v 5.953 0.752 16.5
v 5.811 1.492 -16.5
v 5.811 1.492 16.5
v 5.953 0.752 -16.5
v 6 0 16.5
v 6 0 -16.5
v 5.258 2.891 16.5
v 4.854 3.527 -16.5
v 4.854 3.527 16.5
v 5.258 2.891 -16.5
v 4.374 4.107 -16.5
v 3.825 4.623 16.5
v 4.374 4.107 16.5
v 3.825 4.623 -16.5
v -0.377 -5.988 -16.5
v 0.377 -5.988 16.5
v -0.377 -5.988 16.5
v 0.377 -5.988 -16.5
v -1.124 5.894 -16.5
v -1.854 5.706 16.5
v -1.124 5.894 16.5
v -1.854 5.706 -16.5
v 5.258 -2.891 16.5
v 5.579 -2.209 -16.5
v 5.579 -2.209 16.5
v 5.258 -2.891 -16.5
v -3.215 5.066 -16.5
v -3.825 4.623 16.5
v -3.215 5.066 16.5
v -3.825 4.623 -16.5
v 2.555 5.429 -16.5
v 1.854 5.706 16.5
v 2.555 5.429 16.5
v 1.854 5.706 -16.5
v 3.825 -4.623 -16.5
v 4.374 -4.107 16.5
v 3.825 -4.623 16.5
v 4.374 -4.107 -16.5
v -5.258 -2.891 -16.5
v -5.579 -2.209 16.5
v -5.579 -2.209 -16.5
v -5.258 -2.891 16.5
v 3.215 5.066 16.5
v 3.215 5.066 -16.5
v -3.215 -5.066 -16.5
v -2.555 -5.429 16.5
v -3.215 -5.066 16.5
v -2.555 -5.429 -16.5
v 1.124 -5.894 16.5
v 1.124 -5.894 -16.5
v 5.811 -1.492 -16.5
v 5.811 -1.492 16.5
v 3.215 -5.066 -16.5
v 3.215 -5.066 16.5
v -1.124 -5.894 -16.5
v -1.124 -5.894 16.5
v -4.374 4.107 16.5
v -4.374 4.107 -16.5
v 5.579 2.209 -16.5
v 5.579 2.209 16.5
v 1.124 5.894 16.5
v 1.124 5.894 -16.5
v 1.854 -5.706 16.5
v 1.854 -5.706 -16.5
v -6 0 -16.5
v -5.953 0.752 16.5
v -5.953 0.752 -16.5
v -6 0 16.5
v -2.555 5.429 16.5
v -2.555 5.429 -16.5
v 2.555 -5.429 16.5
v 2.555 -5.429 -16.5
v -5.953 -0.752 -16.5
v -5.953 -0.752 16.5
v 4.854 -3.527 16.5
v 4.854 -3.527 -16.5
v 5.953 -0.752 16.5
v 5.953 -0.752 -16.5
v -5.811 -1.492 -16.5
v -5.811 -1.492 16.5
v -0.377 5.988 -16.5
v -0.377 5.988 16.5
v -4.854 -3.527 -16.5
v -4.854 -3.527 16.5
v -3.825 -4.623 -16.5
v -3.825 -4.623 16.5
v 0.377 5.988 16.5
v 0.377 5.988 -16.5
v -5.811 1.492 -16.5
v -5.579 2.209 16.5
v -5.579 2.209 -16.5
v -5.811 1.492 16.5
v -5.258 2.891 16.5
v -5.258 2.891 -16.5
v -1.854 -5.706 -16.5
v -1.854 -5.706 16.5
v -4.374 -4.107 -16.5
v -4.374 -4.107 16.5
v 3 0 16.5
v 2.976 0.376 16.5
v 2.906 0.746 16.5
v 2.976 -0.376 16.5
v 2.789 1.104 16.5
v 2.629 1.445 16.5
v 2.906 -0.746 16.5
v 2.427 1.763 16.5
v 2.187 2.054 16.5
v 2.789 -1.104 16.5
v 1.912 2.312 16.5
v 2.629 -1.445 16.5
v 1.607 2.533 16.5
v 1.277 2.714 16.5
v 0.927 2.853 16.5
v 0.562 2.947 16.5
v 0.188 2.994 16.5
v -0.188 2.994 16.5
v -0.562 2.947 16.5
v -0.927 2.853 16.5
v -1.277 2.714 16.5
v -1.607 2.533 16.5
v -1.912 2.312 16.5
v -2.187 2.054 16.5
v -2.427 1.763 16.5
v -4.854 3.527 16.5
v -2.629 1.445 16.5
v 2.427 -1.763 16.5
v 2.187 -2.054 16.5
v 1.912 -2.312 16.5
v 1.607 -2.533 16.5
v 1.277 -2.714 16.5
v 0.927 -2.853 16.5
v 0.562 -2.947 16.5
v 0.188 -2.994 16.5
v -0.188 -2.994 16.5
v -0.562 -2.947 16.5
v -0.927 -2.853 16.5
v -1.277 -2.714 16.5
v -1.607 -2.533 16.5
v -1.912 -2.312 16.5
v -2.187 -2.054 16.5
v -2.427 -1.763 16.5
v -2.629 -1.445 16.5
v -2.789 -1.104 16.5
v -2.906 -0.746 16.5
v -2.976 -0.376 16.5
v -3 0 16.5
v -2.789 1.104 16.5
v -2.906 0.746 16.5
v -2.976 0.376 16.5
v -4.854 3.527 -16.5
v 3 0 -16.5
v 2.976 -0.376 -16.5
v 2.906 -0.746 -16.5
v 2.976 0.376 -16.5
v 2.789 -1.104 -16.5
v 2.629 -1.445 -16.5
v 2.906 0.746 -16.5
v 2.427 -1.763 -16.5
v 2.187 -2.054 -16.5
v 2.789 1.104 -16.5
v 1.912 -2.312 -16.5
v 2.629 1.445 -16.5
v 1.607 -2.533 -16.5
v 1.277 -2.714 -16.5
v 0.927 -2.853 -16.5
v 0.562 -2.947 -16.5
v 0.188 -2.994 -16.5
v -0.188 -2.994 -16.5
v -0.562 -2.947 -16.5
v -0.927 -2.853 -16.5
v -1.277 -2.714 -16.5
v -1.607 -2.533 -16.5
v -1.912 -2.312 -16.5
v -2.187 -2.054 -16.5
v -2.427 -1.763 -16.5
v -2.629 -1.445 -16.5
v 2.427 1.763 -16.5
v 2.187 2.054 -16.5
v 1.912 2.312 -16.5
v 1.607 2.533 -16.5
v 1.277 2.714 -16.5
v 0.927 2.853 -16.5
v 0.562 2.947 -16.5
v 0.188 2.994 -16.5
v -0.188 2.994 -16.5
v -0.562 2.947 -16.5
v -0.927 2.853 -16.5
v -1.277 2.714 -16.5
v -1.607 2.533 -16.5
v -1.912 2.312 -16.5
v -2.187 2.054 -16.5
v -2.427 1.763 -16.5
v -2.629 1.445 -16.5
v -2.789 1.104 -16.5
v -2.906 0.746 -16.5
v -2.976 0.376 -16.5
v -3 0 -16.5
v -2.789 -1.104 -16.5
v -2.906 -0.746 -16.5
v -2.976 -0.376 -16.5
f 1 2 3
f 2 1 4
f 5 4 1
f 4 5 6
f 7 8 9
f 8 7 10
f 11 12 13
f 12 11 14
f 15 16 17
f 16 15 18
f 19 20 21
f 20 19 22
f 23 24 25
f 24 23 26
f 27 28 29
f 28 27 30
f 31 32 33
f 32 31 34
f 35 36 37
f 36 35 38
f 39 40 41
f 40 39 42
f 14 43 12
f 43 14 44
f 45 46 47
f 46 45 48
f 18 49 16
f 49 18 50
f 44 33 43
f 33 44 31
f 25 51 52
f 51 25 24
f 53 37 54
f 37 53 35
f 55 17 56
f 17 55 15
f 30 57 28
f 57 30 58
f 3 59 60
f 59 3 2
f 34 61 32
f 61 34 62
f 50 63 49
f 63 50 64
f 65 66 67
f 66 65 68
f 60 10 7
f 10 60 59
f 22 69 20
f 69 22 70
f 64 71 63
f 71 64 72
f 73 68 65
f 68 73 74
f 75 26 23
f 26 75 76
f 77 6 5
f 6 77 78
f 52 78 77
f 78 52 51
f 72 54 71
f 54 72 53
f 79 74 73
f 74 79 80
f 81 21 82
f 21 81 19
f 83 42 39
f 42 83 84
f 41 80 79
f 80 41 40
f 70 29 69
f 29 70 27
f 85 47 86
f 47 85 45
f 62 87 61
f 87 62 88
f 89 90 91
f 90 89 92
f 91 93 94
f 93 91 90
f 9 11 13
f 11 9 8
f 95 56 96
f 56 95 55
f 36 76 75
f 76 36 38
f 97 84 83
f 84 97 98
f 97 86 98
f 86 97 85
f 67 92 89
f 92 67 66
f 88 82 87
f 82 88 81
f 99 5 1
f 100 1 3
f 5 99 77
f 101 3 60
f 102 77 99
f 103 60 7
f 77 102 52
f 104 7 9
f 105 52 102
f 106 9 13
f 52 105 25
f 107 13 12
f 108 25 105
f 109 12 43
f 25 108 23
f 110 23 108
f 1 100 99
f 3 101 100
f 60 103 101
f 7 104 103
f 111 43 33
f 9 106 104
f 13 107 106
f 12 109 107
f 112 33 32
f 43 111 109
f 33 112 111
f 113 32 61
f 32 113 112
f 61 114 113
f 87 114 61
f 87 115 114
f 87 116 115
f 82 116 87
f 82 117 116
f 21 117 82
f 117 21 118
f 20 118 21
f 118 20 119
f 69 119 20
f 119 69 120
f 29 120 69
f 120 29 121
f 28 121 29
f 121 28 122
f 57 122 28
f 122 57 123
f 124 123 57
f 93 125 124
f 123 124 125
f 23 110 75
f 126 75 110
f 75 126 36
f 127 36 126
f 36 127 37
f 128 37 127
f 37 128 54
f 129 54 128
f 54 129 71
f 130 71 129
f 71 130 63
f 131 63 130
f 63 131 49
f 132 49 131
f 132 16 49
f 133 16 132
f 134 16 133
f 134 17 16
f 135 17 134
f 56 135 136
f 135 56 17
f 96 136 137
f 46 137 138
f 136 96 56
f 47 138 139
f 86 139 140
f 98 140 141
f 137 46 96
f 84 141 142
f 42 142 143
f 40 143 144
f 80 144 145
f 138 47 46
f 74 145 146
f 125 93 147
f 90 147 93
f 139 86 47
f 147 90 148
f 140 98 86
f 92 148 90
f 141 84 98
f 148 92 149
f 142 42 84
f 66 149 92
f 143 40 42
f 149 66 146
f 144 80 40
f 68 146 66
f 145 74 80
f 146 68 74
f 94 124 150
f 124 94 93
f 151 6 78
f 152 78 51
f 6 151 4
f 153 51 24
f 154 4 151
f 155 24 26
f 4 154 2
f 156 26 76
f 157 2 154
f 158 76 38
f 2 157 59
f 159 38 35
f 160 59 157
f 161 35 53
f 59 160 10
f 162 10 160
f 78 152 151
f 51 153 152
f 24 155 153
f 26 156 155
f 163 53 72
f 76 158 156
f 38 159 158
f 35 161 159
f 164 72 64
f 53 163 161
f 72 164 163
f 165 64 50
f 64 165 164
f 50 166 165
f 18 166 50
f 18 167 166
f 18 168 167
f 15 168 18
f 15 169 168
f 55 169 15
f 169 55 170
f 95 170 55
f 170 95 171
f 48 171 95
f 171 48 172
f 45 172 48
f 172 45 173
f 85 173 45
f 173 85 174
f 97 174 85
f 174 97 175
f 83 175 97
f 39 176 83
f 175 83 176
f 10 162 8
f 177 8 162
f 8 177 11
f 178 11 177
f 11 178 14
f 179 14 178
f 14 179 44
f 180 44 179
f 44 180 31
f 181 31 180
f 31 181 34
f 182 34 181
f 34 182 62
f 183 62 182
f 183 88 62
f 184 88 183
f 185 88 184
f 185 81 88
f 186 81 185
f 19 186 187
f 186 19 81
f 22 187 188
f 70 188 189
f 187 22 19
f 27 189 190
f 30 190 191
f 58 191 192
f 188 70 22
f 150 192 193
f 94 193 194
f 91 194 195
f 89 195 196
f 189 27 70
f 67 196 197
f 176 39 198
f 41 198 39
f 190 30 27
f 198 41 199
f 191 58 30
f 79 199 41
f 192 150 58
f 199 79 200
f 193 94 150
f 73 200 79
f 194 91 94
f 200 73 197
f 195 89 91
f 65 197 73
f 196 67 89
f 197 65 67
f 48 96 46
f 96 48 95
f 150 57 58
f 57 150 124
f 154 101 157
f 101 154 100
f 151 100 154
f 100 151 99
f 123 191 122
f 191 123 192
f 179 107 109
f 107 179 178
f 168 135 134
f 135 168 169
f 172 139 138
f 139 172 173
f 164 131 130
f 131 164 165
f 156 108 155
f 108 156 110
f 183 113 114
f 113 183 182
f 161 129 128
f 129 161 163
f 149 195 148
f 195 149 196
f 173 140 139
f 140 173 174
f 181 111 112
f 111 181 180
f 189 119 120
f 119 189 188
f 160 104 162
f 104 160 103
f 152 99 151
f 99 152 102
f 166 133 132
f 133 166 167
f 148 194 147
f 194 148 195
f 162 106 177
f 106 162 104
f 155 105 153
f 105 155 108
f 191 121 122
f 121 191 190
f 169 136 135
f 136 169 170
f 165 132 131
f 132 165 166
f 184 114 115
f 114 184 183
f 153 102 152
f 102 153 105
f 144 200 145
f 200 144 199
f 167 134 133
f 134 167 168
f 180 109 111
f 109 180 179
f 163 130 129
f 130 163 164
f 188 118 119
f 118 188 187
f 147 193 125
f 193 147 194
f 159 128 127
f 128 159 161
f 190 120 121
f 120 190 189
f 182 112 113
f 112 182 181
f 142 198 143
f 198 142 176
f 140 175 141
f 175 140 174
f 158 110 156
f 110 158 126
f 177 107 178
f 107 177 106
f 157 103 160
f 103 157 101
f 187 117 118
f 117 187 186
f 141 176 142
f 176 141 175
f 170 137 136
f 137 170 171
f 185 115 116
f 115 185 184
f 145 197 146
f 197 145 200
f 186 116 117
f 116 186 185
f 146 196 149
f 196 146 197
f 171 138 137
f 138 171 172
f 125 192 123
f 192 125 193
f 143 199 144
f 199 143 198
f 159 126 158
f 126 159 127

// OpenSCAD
$fn = 50;


difference() {
	union() {
		translate(v = [0, 0, -16.5000000000]) {
			cylinder(h = 33, r = 6.0000000000);
		}
	}
	union() {
		translate(v = [0, 0, -100.0000000000]) {
			cylinder(h = 200, r = 3.0000000000);
		}
	}
}
